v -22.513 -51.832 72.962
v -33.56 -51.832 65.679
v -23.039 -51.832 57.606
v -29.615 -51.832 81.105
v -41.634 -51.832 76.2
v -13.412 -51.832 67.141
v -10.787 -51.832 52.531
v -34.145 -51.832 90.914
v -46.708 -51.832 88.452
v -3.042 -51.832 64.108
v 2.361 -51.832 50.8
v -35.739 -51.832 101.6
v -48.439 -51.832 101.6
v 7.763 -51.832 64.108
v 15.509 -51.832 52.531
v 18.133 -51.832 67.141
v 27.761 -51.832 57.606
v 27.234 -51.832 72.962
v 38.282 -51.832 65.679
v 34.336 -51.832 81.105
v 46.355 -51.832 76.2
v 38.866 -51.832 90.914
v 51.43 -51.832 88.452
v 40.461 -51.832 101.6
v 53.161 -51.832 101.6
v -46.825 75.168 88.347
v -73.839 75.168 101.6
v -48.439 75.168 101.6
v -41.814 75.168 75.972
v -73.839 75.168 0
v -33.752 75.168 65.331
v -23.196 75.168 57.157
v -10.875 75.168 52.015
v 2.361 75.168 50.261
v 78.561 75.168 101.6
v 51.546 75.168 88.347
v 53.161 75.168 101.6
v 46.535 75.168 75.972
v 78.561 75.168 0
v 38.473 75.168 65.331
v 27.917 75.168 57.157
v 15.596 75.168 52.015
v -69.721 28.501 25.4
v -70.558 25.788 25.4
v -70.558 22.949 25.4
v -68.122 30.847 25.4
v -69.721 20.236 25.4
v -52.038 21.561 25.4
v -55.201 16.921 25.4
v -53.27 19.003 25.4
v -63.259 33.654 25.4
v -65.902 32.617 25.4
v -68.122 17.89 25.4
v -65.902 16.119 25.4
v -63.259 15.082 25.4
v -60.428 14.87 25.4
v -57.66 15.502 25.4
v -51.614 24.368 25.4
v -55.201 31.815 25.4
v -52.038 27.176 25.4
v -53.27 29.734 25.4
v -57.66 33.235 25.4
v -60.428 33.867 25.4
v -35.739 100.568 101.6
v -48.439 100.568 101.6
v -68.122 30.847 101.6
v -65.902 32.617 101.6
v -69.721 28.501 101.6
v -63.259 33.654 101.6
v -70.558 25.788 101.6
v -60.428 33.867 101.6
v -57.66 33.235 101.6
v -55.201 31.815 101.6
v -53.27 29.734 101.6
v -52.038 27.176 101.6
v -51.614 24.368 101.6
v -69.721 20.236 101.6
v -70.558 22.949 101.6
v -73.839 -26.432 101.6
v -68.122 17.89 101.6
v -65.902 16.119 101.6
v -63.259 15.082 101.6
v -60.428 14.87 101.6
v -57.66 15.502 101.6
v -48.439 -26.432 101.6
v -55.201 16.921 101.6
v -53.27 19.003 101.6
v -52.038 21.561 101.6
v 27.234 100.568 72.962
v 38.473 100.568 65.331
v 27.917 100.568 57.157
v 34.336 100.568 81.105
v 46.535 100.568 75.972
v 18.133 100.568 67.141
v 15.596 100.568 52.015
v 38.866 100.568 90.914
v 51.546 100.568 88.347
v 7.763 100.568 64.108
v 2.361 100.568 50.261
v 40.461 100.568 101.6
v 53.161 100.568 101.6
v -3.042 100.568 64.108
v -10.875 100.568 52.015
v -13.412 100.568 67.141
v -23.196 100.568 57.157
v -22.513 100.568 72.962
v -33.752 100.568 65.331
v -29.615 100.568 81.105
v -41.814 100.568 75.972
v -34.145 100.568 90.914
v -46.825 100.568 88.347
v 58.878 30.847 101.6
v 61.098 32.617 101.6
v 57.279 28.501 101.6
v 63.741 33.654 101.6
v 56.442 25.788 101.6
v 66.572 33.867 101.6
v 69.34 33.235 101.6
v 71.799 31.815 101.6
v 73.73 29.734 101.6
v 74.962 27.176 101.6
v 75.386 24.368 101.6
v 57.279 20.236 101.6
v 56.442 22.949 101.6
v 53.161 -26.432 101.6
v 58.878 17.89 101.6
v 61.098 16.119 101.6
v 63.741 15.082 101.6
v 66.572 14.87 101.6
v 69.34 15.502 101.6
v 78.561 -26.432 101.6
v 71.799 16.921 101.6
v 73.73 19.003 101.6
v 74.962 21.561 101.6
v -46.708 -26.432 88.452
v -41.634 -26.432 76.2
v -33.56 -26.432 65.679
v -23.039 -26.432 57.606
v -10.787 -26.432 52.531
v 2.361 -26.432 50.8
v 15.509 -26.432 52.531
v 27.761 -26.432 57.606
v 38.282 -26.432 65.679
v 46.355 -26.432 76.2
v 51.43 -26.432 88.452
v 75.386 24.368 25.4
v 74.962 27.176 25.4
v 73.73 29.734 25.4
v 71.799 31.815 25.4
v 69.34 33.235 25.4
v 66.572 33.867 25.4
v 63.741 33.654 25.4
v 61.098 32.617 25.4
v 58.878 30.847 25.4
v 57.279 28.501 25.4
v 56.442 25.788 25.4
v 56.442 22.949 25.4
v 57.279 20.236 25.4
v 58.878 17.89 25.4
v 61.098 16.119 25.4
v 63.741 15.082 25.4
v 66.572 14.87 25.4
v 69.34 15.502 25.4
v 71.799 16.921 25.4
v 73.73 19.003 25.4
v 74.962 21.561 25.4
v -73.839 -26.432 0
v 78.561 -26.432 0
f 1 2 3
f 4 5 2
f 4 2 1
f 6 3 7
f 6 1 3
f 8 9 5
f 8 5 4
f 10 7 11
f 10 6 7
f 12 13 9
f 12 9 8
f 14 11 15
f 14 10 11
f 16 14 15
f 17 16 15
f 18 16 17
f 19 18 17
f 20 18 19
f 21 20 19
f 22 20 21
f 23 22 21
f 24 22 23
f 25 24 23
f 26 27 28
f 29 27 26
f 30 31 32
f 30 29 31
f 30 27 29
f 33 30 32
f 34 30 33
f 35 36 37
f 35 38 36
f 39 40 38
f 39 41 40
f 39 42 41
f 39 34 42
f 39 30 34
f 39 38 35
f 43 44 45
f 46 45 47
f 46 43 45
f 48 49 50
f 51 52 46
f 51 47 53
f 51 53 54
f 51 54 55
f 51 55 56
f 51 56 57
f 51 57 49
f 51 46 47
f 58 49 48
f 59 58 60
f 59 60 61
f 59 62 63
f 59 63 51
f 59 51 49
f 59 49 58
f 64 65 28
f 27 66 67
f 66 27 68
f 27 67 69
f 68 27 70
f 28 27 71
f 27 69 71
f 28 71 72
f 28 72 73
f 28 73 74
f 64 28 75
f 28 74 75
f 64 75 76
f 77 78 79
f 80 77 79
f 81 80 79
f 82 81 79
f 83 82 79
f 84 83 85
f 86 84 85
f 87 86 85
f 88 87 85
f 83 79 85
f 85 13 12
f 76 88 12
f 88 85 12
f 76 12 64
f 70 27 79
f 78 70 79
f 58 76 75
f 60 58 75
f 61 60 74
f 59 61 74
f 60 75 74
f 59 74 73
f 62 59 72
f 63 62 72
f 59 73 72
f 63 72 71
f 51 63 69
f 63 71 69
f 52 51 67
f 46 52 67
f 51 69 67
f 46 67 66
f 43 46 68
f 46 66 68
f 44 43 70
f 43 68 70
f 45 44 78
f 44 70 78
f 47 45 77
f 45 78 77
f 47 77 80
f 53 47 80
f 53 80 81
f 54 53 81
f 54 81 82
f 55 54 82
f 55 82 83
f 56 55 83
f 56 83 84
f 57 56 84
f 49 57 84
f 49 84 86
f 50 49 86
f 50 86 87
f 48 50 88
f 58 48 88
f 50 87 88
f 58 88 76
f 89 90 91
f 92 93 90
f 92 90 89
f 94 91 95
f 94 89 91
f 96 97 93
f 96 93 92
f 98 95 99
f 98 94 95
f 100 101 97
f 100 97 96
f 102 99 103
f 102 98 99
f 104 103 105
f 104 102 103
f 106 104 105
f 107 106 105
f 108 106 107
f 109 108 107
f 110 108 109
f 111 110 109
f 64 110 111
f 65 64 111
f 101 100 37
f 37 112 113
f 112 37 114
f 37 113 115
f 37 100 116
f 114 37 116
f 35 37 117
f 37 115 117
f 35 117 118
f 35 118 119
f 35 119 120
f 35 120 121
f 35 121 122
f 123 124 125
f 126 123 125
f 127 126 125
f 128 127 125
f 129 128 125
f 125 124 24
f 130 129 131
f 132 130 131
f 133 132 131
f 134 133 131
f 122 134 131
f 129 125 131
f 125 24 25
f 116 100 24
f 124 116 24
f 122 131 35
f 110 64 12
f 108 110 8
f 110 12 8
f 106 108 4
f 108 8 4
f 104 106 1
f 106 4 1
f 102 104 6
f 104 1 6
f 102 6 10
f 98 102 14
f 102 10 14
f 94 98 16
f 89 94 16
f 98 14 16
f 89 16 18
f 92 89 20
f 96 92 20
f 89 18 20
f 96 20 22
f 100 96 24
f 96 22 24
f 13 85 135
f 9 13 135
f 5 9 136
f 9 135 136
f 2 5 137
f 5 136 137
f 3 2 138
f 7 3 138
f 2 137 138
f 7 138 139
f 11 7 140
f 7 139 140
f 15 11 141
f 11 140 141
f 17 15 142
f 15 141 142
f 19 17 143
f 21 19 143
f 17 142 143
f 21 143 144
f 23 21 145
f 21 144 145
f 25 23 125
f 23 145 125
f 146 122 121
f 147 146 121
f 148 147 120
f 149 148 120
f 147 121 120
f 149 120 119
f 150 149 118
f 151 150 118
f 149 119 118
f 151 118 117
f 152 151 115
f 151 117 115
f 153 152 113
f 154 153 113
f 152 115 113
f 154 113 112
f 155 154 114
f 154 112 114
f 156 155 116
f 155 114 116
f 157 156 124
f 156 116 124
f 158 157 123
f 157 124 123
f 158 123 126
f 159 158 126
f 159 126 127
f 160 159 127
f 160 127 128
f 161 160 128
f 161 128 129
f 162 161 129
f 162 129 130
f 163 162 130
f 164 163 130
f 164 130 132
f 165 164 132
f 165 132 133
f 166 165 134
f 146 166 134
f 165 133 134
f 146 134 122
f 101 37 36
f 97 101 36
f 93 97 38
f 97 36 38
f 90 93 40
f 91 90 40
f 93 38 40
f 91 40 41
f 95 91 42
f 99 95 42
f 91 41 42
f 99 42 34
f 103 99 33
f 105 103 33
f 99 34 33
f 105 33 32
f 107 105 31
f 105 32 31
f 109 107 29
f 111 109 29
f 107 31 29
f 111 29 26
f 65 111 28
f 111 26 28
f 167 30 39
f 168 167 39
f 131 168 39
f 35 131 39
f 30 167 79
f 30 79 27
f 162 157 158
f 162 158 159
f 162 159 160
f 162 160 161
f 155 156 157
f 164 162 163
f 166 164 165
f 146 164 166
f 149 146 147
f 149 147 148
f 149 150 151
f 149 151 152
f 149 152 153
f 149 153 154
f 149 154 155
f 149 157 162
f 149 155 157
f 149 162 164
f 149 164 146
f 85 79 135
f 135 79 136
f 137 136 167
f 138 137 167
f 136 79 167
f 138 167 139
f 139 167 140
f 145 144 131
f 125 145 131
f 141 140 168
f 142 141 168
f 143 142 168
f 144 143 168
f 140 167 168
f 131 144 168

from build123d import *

# Parameters (mm, degrees)
F0_W      = 152.4
F0_H      = 101.6
F1_DEPTH  = 101.6
F3_DEPTH  = 25.4
F4_DEPTH  = 128.27
F6_DEPTH  = 25.4
F7_R      = 9.525
F8_DEPTH  = 76.2
F9_R      = 9.525
F10_DEPTH = 76.2


with BuildPart() as f1:
    # F0 (on Top) → F1 (new body)
    with BuildSketch(Plane.XY):
        with Locations((2.3605413735, 24.3682915387)):
            Rectangle(F0_W, F0_H)
    extrude(amount=F1_DEPTH)

    # F2 (on face) → F3 (join)
    with BuildSketch(Plane.XZ.offset(26.4317084613)):
        with BuildLine():
            Line((-35.7394586265, 101.6), (-48.4394586265, 101.6))
            ThreePointArc((-48.4394586265, 101.6), (2.3605413735, 50.8), (53.1605413735, 101.6))
            Line((53.1605413735, 101.6), (40.4605413735, 101.6))
            ThreePointArc((40.4605413735, 101.6), (2.3605413735, 63.7227148693), (-35.7394586265, 101.6))
        make_face()
    extrude(amount=F3_DEPTH)

    # F4 (cut): a face of the model
    f4_faces = [f1.faces().sort_by_distance(p)[0] for p in [
        (2.3605413735, -26.4317084613, 85.532177983),
    ]]
    extrude(f4_faces, amount=-F4_DEPTH, mode=Mode.SUBTRACT)

    # F5 (on face) → F6 (join)
    with BuildSketch(Plane(origin=(0, 75.1682915387, 0), x_dir=(-1, 0, 0), z_dir=(0, 1, 0))):
        with BuildLine():
            Line((-40.4605413735, 101.6), (-53.1605413735, 101.6))
            ThreePointArc((-53.1605413735, 101.6), (-2.3605413735, 50.2605806131), (48.4394586265, 101.6))
            Line((48.4394586265, 101.6), (35.7394586265, 101.6))
            ThreePointArc((35.7394586265, 101.6), (-2.3605413735, 63.7227148693), (-40.4605413735, 101.6))
        make_face()
    extrude(amount=F6_DEPTH)

    # F7 (on face) → F8 (cut)
    with BuildSketch(Plane.XY.offset(101.6)):
        with Locations((-61.1394586265, 24.3682915387)):
            Circle(F7_R)
    extrude(amount=-F8_DEPTH, mode=Mode.SUBTRACT)

    # F9 (on face) → F10 (cut)
    with BuildSketch(Plane.XY.offset(101.6)):
        with Locations((65.8605413735, 24.3682915387)):
            Circle(F9_R)
    extrude(amount=-F10_DEPTH, mode=Mode.SUBTRACT)


solid = f1.part
